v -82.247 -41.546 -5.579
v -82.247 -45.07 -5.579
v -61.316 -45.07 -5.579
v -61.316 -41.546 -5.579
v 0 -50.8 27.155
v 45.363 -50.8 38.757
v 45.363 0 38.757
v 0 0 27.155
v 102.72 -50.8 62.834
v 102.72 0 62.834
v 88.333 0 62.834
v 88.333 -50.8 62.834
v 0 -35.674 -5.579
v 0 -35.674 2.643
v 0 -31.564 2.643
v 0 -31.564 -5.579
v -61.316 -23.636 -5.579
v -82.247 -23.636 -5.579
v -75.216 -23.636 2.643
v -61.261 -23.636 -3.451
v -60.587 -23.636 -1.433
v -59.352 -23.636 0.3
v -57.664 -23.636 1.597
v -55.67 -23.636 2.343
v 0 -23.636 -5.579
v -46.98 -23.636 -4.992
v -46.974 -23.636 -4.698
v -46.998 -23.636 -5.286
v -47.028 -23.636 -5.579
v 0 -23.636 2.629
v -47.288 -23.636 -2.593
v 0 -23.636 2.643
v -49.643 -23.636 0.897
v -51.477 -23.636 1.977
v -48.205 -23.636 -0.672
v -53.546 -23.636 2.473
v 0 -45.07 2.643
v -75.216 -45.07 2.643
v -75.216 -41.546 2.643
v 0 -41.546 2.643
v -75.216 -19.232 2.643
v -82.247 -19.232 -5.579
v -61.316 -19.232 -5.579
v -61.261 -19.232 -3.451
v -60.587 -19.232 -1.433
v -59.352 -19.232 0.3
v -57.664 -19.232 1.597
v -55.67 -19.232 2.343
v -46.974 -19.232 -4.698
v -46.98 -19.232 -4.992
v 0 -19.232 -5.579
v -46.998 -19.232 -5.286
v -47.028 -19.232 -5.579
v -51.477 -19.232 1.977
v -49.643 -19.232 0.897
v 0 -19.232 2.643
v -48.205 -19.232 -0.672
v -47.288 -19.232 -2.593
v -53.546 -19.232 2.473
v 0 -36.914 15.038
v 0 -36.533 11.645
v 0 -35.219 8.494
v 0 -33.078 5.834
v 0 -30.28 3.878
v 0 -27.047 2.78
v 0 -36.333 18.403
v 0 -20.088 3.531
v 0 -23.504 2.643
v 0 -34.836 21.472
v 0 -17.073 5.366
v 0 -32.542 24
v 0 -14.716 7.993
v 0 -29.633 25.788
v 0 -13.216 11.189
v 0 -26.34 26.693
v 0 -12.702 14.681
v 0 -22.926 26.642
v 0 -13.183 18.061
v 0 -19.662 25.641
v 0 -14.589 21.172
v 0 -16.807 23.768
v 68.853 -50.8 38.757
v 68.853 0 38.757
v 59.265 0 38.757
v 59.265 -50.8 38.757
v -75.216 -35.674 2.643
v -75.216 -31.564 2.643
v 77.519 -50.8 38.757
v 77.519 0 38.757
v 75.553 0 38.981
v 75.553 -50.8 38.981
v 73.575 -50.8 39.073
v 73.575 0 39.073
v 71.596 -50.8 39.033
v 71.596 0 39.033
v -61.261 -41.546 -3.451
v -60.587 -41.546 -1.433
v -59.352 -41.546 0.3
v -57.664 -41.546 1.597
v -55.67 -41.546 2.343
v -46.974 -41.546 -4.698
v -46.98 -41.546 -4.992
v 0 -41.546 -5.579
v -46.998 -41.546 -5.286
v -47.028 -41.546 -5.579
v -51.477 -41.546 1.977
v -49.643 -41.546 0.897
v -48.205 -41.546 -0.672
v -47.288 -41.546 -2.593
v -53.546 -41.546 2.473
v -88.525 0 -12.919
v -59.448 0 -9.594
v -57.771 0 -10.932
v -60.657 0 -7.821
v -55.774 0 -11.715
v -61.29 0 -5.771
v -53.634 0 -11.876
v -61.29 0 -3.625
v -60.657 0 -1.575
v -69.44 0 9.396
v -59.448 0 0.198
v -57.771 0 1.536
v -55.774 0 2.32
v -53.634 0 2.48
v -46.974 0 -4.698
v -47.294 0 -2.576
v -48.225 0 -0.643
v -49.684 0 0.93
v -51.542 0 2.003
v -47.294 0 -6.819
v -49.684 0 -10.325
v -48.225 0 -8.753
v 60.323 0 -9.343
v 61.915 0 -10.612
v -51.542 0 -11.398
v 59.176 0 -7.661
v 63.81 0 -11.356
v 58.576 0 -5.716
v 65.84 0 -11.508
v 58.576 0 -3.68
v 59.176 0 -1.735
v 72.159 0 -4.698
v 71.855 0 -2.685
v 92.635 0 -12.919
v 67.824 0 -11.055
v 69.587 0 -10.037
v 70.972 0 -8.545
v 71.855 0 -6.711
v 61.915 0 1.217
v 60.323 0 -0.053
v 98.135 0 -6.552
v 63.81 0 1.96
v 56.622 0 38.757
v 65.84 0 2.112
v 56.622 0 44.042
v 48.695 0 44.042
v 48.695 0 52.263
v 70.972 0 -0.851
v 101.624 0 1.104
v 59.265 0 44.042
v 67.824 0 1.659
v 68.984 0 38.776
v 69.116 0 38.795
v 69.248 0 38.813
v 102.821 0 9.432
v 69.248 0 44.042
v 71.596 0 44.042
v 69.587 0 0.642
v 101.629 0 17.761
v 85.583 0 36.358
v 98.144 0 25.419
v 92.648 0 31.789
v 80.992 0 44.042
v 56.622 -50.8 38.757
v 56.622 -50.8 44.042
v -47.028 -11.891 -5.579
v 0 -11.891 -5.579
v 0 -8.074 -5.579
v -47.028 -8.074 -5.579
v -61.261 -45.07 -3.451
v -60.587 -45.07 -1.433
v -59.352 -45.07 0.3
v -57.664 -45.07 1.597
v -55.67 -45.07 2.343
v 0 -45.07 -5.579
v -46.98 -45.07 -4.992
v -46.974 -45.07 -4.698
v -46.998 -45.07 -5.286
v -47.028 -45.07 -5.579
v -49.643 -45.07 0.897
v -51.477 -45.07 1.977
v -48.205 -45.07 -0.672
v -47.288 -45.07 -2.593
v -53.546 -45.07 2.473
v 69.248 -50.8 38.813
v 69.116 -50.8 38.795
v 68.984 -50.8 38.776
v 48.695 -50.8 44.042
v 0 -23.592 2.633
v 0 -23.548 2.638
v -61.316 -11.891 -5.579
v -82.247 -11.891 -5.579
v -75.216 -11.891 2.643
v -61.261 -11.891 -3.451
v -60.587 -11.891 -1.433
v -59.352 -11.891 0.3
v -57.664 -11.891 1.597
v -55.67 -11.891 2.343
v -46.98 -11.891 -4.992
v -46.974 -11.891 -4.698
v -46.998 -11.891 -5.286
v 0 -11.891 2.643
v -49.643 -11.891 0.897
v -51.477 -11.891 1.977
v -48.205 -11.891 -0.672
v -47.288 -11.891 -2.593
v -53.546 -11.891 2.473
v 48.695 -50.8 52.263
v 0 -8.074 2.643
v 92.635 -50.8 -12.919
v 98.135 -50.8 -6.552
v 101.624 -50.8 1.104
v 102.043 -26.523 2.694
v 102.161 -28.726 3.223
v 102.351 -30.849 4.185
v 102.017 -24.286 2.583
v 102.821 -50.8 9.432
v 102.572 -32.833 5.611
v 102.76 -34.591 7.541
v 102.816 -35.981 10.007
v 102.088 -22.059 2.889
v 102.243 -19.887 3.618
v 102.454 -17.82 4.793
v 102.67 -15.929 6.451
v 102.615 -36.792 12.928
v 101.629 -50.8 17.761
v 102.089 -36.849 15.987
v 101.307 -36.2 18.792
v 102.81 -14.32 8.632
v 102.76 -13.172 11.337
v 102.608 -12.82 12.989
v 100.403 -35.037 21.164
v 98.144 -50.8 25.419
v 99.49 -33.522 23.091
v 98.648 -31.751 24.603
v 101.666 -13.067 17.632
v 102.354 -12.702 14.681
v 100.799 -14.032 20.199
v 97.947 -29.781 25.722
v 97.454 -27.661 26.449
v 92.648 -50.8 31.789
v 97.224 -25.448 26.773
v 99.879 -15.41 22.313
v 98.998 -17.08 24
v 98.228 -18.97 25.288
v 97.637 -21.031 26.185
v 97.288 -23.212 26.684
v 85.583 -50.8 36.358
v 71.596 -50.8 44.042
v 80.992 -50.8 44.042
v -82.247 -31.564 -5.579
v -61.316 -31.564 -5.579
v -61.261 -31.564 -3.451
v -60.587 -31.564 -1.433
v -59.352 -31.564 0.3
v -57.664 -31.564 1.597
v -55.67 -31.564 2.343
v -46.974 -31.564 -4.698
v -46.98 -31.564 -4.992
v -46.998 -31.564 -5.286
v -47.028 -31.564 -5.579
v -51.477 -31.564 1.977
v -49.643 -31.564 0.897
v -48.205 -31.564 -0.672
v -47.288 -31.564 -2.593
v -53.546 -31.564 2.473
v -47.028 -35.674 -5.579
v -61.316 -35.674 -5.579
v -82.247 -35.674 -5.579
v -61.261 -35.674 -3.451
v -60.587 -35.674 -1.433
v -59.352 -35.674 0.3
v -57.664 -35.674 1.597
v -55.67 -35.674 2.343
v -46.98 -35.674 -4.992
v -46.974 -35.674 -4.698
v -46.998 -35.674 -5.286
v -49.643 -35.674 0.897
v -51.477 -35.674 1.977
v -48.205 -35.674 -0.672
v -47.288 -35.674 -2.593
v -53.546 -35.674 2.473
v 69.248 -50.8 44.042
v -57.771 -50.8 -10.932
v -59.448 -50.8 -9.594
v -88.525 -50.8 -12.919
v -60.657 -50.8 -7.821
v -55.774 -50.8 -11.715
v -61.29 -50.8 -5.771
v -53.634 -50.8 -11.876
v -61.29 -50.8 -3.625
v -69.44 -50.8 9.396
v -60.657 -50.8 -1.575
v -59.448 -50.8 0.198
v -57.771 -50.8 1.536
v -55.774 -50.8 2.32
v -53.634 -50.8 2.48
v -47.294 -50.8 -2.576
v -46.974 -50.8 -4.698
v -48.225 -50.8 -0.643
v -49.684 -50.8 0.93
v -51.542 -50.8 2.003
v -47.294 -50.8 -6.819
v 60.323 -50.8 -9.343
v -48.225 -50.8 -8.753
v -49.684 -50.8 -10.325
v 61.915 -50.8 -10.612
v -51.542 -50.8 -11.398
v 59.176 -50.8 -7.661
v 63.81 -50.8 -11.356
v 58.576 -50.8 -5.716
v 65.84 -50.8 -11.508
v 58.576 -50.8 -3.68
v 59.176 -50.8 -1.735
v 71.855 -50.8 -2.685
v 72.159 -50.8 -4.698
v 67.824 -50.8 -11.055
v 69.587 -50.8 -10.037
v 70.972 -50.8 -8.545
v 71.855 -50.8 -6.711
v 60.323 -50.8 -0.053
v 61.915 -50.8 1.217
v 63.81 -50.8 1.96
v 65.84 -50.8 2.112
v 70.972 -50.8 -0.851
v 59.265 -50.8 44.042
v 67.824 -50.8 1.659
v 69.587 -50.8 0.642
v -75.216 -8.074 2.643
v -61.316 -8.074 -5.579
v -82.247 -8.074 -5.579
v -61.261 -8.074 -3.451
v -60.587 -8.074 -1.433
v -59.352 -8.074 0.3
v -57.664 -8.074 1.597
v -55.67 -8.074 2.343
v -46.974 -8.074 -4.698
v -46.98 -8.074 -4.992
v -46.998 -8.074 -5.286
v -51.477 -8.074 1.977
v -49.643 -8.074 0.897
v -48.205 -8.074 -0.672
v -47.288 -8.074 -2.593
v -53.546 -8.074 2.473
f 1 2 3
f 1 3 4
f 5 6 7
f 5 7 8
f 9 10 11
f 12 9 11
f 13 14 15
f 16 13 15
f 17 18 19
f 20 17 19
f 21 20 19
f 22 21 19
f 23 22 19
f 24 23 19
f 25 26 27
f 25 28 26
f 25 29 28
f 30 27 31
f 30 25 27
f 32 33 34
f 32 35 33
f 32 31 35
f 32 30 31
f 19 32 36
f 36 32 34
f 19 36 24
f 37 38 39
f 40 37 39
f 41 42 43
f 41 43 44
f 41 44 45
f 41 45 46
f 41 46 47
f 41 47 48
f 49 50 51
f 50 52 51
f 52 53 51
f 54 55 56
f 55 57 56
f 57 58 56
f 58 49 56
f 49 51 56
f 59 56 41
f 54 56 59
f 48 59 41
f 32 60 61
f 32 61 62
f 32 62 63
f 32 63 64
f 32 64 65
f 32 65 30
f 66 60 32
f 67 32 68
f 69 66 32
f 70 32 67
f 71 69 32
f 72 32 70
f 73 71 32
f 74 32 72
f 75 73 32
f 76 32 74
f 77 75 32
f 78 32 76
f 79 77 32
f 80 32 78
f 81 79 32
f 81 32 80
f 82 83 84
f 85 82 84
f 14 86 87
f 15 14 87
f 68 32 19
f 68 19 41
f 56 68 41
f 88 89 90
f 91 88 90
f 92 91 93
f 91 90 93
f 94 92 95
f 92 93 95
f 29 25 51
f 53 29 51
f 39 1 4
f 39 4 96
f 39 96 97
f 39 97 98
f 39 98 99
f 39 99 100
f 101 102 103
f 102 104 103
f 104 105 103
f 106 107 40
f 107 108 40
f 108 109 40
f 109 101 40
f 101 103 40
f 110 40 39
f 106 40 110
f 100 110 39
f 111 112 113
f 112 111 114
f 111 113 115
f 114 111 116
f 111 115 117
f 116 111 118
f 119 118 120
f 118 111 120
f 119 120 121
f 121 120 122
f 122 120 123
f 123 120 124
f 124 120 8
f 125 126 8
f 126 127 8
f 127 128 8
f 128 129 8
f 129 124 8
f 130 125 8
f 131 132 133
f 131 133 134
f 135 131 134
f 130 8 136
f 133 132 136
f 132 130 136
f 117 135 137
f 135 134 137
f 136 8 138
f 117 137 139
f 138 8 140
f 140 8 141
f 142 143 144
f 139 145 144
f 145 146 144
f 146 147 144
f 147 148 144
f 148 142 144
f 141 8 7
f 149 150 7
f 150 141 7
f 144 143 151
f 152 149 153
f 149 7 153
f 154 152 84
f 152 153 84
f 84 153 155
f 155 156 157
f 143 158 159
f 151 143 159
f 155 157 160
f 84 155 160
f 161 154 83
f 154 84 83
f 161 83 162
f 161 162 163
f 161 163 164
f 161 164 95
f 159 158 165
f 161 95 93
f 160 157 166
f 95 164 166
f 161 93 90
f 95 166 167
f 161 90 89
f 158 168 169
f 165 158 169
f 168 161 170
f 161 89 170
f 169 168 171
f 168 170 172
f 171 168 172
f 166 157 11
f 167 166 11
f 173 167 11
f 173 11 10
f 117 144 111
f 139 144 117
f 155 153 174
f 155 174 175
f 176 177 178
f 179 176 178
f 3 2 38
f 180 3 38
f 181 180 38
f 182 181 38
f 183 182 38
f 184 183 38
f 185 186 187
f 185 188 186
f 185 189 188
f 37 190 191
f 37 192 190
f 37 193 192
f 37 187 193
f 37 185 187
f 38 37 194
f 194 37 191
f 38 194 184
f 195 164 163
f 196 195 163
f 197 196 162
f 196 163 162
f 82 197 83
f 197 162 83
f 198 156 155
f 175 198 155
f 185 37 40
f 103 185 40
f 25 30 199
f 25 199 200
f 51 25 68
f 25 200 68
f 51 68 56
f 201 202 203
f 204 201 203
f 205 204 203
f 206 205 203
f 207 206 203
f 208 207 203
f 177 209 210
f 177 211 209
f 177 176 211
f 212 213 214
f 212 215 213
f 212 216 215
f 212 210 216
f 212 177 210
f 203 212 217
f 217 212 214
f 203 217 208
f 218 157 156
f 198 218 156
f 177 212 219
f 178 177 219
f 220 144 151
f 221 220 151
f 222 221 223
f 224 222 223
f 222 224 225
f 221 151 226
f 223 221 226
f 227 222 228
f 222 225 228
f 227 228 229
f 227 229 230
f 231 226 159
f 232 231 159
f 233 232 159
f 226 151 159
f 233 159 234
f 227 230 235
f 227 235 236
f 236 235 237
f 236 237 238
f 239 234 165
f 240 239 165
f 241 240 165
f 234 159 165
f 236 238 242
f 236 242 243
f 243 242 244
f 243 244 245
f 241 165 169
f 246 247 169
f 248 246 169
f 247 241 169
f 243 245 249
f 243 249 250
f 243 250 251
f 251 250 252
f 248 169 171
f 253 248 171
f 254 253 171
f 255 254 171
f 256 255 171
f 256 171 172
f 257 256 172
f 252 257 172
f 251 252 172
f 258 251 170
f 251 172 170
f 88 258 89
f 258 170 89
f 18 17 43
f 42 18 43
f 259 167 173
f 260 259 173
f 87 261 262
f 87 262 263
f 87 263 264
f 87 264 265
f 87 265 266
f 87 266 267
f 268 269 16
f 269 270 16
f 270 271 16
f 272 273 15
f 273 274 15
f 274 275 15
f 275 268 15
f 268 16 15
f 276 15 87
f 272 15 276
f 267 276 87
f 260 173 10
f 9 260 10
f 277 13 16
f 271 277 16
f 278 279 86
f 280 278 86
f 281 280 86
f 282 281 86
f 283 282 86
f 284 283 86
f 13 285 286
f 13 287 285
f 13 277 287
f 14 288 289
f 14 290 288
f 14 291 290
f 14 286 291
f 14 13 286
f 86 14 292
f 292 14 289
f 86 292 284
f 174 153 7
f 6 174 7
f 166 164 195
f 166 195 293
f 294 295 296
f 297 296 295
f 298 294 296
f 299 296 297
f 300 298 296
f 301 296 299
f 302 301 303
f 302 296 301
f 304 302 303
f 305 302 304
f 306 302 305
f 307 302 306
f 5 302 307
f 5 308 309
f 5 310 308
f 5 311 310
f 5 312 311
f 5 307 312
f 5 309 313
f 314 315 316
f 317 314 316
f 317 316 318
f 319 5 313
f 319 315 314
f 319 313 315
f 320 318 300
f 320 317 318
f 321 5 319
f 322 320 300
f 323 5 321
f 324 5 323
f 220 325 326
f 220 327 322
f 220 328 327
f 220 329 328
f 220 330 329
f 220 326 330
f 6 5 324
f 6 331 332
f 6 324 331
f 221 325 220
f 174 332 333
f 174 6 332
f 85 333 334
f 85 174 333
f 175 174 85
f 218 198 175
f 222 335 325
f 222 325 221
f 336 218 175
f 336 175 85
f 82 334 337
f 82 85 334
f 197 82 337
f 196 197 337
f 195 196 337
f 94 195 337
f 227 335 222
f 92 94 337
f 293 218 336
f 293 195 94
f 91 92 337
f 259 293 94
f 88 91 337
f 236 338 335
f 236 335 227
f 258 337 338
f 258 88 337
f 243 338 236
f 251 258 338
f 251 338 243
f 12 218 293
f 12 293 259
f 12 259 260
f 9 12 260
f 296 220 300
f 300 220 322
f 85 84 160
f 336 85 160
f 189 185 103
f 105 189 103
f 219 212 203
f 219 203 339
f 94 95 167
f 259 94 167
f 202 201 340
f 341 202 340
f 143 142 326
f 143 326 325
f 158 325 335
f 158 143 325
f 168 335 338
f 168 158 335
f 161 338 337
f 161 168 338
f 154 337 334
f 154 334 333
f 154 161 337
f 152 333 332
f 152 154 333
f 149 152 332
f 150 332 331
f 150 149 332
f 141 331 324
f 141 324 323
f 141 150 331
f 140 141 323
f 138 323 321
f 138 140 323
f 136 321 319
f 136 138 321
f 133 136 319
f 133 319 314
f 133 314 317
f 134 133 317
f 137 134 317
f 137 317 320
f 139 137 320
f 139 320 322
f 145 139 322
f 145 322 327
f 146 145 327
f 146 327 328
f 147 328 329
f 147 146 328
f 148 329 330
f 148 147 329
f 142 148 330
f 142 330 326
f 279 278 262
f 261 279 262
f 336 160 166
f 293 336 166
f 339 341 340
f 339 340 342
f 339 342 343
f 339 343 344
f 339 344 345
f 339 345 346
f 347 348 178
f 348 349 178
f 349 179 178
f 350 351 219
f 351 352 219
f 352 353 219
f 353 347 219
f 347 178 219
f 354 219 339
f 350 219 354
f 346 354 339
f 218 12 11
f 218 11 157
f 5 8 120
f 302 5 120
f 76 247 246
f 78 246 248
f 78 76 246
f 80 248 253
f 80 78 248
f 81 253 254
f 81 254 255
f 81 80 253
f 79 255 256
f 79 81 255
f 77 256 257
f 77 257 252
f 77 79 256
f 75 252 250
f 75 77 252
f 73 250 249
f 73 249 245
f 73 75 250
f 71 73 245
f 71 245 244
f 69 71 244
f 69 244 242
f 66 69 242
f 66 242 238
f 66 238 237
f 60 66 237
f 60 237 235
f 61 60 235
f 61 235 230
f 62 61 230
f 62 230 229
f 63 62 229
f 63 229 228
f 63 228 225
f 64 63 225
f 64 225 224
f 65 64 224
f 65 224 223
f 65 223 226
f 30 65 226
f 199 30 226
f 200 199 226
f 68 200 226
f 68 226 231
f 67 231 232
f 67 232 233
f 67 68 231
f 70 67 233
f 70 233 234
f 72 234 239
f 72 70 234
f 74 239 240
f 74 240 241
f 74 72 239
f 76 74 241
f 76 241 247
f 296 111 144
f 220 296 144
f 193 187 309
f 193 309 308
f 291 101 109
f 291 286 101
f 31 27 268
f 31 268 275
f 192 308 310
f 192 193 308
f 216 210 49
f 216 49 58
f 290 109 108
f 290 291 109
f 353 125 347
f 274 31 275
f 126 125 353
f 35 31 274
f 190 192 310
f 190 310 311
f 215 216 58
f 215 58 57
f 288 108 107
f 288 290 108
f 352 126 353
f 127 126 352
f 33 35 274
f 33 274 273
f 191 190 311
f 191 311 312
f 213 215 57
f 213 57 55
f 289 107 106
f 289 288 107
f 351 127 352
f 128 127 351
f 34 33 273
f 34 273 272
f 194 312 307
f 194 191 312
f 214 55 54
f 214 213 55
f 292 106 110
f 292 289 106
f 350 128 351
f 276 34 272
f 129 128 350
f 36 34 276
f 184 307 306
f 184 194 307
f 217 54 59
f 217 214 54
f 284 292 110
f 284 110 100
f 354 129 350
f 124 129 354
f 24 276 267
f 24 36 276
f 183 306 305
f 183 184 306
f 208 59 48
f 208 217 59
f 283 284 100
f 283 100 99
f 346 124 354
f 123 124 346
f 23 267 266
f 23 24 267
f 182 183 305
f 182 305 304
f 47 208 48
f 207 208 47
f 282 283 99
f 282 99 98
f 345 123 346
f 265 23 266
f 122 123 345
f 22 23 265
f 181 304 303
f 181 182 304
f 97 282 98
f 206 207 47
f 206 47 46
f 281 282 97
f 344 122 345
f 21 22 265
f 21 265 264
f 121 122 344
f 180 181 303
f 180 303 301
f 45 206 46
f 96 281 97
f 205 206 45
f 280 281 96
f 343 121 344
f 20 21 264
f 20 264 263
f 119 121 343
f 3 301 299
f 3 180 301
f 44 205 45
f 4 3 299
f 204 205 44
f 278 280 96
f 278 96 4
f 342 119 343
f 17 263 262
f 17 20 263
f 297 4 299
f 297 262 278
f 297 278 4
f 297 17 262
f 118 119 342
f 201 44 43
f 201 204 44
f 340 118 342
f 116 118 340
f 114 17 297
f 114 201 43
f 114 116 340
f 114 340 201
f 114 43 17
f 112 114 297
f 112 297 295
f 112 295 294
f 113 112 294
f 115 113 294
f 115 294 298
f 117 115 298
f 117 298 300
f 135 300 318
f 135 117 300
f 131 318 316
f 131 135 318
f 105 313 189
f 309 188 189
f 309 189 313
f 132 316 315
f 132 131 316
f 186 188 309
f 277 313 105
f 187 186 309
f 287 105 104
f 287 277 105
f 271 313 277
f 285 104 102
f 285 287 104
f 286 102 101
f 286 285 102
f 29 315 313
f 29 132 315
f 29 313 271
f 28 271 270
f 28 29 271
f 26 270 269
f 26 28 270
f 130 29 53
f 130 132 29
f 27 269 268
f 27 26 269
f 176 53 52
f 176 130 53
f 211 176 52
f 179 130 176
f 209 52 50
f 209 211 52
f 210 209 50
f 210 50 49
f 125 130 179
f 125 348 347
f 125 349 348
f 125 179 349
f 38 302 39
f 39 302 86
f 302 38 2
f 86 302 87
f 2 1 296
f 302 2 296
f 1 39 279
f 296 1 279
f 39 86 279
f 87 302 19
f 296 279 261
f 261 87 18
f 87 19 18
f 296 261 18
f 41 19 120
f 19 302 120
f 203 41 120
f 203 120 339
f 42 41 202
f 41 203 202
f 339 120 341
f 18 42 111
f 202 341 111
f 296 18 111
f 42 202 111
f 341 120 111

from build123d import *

# Parameters (mm, degrees)
F0_R     = 7.198052
F0_R_2   = 6.829302
F1_DEPTH = 50.8
F2_R     = 12.108845
F3_DEPTH = 127
F4_W     = 2.642531
F4_H     = 6.459523
F4_W_2   = 2.348915
F4_H_2   = 7.340368
F5_DEPTH = 50.8
F6_W     = 3.81699
F6_H     = 8.221211
F6_W_2   = 4.404219
F6_W_3   = 4.110609
F6_W_4   = 3.523376
F7_DEPTH = 101.6


with BuildPart() as f1:
    # F0 (on Front) → F1 (new body)
    with BuildSketch(Plane.XZ):
        with BuildLine():
            Line((68.852641, 38.757138), (45.363467, 38.757138))
            Line((45.363467, 38.757138), (0, 27.155228))
            Line((0, 27.155228), (-69.439873, 9.39567))
            Line((-69.439873, 9.39567), (-88.524826, -12.919046))
            Line((-88.524826, -12.919046), (92.63543, -12.919046))
            ThreePointArc((92.63543, -12.919046), (101.629006, 17.76077), (77.51909, 38.757138))
            Line((77.51909, 38.757138), (68.852641, 38.757138))
        make_face()
        with Locations((-54.171909, -4.697835)):
            Circle(F0_R, mode=Mode.SUBTRACT)
        with Locations((65.329269, -4.697835)):
            Circle(F0_R_2, mode=Mode.SUBTRACT)
        with BuildLine():
            ThreePointArc((77.51909, 38.757138), (73.185865, 39.07565), (68.852641, 38.757138))
            Line((68.852641, 38.757138), (77.51909, 38.757138))
        make_face()
    extrude(amount=F1_DEPTH)

    # F2 (on Right) → F3 (cut)
    with BuildSketch(Plane.YZ):
        with Locations((-24.810441, 14.680734)):
            Circle(F2_R)
    extrude(amount=F3_DEPTH, mode=Mode.SUBTRACT)

    # F4 (on Front) → F5 (join)
    with BuildSketch(Plane.XZ):
        Polygon((48.69454, 52.263413), (48.69454, 44.042204), (56.622133, 44.042204), (59.264664, 44.042204), (69.247566, 44.042204), (71.596481, 44.042204), (80.992155, 44.042204), (102.719635, 62.83354), (88.332519, 62.83354), align=None)
        with Locations((57.943399, 40.812443)):
            Rectangle(F4_W, F4_H)
        with Locations((70.422023, 40.37202)):
            Rectangle(F4_W_2, F4_H_2)
    extrude(amount=F5_DEPTH)

    # F6 (on Right) → F7 (cut)
    with BuildSketch(Plane.YZ):
        with Locations((-9.982899, -1.468074)):
            Rectangle(F6_W, F6_H)
        with Locations((-21.433872, -1.468074)):
            Rectangle(F6_W_2, F6_H)
        with Locations((-33.618881, -1.468074)):
            Rectangle(F6_W_3, F6_H)
        with Locations((-43.308167, -1.468074)):
            Rectangle(F6_W_4, F6_H)
    extrude(amount=-F7_DEPTH, mode=Mode.SUBTRACT)


solid = f1.part
